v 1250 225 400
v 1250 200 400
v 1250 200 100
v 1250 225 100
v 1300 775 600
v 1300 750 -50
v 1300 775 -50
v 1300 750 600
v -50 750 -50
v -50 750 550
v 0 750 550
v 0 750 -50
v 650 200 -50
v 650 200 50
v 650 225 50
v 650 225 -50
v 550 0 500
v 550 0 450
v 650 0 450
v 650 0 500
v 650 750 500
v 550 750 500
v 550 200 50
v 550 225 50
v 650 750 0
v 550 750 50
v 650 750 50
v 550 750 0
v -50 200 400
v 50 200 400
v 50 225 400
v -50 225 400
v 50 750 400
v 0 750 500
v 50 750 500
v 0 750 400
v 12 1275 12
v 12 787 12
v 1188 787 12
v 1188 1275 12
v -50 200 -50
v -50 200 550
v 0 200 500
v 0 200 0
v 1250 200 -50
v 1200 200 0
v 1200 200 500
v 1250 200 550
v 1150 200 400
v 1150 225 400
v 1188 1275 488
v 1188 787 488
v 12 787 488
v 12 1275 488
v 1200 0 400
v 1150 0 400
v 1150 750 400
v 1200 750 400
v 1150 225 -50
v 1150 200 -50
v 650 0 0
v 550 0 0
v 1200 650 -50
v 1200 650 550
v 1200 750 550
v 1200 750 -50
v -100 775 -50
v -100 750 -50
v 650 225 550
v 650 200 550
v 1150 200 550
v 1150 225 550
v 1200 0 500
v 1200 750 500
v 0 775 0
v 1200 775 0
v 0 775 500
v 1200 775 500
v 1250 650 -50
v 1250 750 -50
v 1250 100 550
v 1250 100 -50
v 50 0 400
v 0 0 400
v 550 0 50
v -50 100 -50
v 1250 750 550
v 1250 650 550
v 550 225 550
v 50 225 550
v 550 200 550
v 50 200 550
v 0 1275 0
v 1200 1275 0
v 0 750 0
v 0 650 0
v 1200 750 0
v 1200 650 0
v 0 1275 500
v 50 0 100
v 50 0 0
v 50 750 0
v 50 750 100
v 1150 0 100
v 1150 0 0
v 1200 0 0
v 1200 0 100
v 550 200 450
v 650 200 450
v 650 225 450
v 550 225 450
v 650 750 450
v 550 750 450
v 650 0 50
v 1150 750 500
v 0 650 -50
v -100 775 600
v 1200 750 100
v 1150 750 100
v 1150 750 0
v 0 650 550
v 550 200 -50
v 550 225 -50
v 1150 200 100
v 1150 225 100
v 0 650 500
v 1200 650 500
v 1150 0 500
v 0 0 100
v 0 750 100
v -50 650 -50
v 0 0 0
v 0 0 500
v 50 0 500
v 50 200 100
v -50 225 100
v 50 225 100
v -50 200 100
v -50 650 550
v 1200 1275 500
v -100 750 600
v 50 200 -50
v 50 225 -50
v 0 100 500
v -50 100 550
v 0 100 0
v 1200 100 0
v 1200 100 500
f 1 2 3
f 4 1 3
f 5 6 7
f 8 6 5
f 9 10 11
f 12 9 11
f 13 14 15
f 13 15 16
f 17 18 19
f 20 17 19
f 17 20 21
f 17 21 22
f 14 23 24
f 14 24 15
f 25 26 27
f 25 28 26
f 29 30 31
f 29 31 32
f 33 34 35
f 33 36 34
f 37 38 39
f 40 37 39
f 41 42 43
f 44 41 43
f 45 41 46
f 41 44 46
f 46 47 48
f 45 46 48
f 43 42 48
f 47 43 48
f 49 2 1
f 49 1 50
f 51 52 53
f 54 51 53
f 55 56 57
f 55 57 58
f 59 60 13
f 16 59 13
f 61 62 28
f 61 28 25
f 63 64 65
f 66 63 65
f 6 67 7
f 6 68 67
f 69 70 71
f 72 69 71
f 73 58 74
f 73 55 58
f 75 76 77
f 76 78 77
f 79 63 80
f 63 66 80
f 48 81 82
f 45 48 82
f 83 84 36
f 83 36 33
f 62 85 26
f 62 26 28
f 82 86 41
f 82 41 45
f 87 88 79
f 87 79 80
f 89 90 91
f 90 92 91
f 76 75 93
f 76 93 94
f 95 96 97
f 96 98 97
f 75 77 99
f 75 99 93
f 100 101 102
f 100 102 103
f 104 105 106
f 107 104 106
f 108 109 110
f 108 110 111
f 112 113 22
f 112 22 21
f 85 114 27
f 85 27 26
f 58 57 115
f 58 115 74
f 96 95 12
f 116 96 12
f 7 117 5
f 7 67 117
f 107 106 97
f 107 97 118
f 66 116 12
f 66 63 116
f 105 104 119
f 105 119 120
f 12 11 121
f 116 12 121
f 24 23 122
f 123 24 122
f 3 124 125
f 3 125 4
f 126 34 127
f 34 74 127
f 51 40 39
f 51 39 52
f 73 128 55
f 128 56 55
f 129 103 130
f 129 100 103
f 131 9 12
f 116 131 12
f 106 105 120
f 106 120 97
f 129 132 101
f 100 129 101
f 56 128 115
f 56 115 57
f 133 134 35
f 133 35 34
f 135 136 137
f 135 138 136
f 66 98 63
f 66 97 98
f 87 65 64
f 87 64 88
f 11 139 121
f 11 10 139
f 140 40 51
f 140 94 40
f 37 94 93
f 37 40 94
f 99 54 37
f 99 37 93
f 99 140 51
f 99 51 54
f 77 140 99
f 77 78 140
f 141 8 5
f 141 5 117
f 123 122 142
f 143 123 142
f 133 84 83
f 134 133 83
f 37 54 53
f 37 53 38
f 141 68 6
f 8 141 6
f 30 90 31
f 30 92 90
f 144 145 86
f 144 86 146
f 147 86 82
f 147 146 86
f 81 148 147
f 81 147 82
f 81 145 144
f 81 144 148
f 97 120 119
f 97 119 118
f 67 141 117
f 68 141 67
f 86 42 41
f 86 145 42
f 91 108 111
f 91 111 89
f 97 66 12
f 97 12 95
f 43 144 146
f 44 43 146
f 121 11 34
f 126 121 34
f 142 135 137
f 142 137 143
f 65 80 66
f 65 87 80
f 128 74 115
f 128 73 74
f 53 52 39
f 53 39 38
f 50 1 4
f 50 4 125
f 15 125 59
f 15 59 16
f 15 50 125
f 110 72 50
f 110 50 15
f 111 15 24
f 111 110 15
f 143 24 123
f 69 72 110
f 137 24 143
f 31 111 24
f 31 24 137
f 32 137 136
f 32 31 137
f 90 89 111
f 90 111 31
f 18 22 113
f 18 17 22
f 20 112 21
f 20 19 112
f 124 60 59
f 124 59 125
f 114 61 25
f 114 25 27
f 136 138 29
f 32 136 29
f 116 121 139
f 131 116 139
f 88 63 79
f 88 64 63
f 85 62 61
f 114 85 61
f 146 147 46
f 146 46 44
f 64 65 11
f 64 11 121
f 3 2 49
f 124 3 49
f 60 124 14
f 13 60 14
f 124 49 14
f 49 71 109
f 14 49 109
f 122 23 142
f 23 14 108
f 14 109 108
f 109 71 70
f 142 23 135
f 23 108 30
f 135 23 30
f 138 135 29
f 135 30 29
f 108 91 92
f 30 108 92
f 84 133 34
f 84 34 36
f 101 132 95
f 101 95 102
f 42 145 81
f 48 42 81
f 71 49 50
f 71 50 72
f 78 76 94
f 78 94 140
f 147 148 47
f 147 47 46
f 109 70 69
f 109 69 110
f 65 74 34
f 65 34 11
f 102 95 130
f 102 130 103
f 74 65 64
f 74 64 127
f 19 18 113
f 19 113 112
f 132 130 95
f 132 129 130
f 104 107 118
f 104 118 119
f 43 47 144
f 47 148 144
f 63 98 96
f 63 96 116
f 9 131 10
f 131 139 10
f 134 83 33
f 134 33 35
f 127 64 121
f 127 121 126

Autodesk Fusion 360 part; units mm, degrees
sketch "Sketch1" plane through (0, 0, 0) normal (0, 1, 0) x (1, 0, 0)
  line L0 (0, 0) -> (50, 0)
  line L1 (50, 0) -> (50, -100)
  line L2 (50, -100) -> (0, -100)
  line L3 (0, -100) -> (0, 0)
  line L4 (1150, -100) -> (1150, 0)
  line L5 (1150, 0) -> (1200, 0)
  line L6 (1200, 0) -> (1200, -100)
  line L7 (1200, -100) -> (1150, -100)
  line L8 (0, -500) -> (0, -400)
  line L9 (0, -400) -> (50, -400)
  line L10 (50, -400) -> (50, -500)
  line L11 (50, -500) -> (0, -500)
  line L12 (1150, -500) -> (1150, -400)
  line L13 (1150, -400) -> (1200, -400)
  line L14 (1200, -400) -> (1200, -500)
  line L15 (1200, -500) -> (1150, -500)
  line L16 (550, 0) -> (650, 0)
  line L17 (650, 0) -> (650, -50)
  line L18 (650, -50) -> (550, -50)
  line L19 (550, -50) -> (550, 0)
  line L20 (550, -450) -> (650, -450)
  line L21 (650, -450) -> (650, -500)
  line L22 (650, -500) -> (550, -500)
  line L23 (550, -500) -> (550, -450)
  line L24 (600, 92.4103) -> (600, -713.1129) construction
  dimension "d1" = 100
  dimension "d2" = 50
  dimension "d5" = 1150
  dimension "d6" = -400
  dimension "d7" = 1200
  dimension "d8" = 500
extrude "Extrude1" add sketch "Sketch1" along normal blind 750 makes body 1 at (50, 250, 33.3333) makes body 2 at (0, 250, 466.6667) makes body 3 at (1150, 250, 66.6667) makes body 4 at (1150, 250, 466.6667) makes body 5 at (583.3333, 250, 0) makes body 6 at (616.6667, 250, 500)
ref_plane "WorkPlane1" through (25, 750, 450) normal (0, 1, 0) x (0, 0, 1)
sketch "Tampo" plane through (25, 750, 450) normal (0, 1, 0) x (1, 0, 0)
  line L0 (-125, 500) -> (1275, 500)
  line L1 (1275, 500) -> (1275, -150)
  line L2 (1275, -150) -> (-125, -150)
  line L3 (-125, -150) -> (-125, 500)
  point P0 (-25, -50)
  point P1 (-25, 450)
  point P2 (1175, 450)
  point P3 (1175, -50)
  dimension "d12" = 100
  dimension "d13" = 50
  dimension "d14" = 100
  dimension "d15" = 100
extrude "Extrude2" add sketch "Tampo" along normal blind 25 separate body makes body 7
sketch "Sketch7" plane through (1200, 0, 0) normal (1, 0, 0) x (0, 0, -1)
  line L0 (-500, 0) -> (-400, 0)
  line L1 (-400, 0) -> (-400, 750)
  line L2 (-400, 750) -> (-500, 750)
  line L3 (-500, 750) -> (-500, 0)
  line L4 (-500, 750) -> (-550, 750)
  line L5 (-550, 750) -> (-550, 650)
  line L6 (-550, 650) -> (-500, 650)
  line L7 (-500, 650) -> (-500, 750)
  line L8 (-600, 775) -> (50, 775)
  line L9 (-100, 0) -> (0, 0)
  line L10 (0, 0) -> (0, 750)
  line L11 (0, 750) -> (-100, 750)
  line L12 (-100, 750) -> (-100, 0)
  line L13 (0, 650) -> (50, 650)
  line L14 (50, 750) -> (-600, 750)
  line L15 (50, 650) -> (50, 750)
  dimension "d18" = 50
  dimension "d19" = 100
  dimension "d22" = 50
  dimension "d23" = 100
extrude "Extrude3" add sketch "Sketch7" against normal up to surface (1200 mm away) separate body contours L3 L4 L5 L6 L7 L14 | L10 L13 L14 L15 makes body 8 at (800, 716.6667, 550) makes body 9 at (800, 683.3333, -50)
sketch "Sketch8" plane through (0, 0, 550) normal (0, 0, 1) x (1, 0, 0)
  line L0 (0, 750) -> (0, 650)
  line L1 (0, 650) -> (1200, 650)
  line L2 (1200, 650) -> (1200, 750)
  line L3 (1200, 750) -> (0, 750)
  line L4 (1200, 650) -> (1250, 650)
  line L5 (1250, 650) -> (1250, 750)
  line L6 (1250, 750) -> (1200, 750)
  line L7 (1200, 750) -> (1200, 650)
  line L8 (0, 650) -> (-50, 650)
  line L9 (-50, 650) -> (-50, 750)
  line L10 (-50, 750) -> (0, 750)
  line L11 (0, 750) -> (0, 650)
  line L12 (1300, 750) -> (-100, 750)
  dimension "d24" = 50
  dimension "d25" = 50
extrude "Extrude4" add sketch "Sketch8" against normal up to surface (600 mm away) separate body contours L0 L8 L9 L10 L11 L12 | L2 L4 L5 L6 L7 L12 makes body 10 at (0, 716.6667, 350) makes body 11 at (1250, 683.3333, 350)
extrude "Extrude5" add 4 faces at (1216.6667, 650, 350) (800, 650, 533.3333) (800, 650, -16.6667) (-16.6667, 650, 350) along direction (0, 1, 0) blind 100 from surface at 100 separate body start surface through (0, 0, 0) normal (0, -1, 0) on bodies 8 9 10 11 makes body 12
sketch "Vidro" plane through (0, 775, 0) normal (0, 1, 0) x (-1, 0, 0)
  line L0 (100, 600) -> (-1300, 600)
  line L1 (-1300, 600) -> (-1300, -50)
  line L2 (-1300, -50) -> (100, -50)
  line L3 (100, -50) -> (100, 600)
  line L4 (0, 0) -> (-1200, 0)
  line L5 (-1200, 0) -> (-1200, 500)
  line L6 (-1200, 500) -> (0, 500)
  line L7 (0, 500) -> (0, 0)
  line L8 (-1188, 488) -> (-12, 488)
  line L9 (-12, 488) -> (-12, 12)
  line L10 (-12, 12) -> (-1188, 12)
  line L11 (-1188, 12) -> (-1188, 488)
  dimension "d31" = 50
  dimension "d32" = 100
  dimension "d33" = 100
  dimension "d34" = 100
  dimension "d35" = 12
extrude "Extrude6" add sketch "Vidro" along normal blind 12 separate body contours L8 L9 L10 L11 makes body 13
extrude "Extrude7" add sketch "Vidro" along normal blind 500 contours L4 L5 L6 L7 bodies 13
sketch "Sketch10" plane through (0, 200, 0) normal (0, 1, 0) x (-1, 0, 0)
  line L0 (0, 0) -> (-1200, 0)
  line L1 (-1200, 0) -> (-1200, 500)
  line L2 (-1200, 500) -> (0, 500)
  line L3 (0, 500) -> (0, 0)
  line L4 (-1250, -50) -> (50, -50)
  line L5 (50, -50) -> (50, 550)
  line L6 (50, 550) -> (-1250, 550)
  line L7 (-1250, 550) -> (-1250, -50)
  line L8 (0, 100) -> (-50, 100)
  line L9 (-50, 100) -> (-50, 0)
  line L10 (-50, 0) -> (0, 0)
  line L11 (0, 0) -> (0, 100)
  line L12 (-50, 500) -> (-50, 400)
  line L13 (-50, 400) -> (0, 400)
  line L14 (0, 400) -> (0, 500)
  line L15 (0, 500) -> (-50, 500)
  line L16 (-550, 50) -> (-650, 50)
  line L17 (-650, 50) -> (-650, 0)
  line L18 (-650, 0) -> (-550, 0)
  line L19 (-550, 0) -> (-550, 50)
  line L20 (-550, 500) -> (-650, 500)
  line L21 (-650, 500) -> (-650, 450)
  line L22 (-650, 450) -> (-550, 450)
  line L23 (-550, 450) -> (-550, 500)
  line L24 (-1200, 100) -> (-1200, 0)
  line L25 (-1200, 0) -> (-1150, 0)
  line L26 (-1150, 0) -> (-1150, 100)
  line L27 (-1150, 100) -> (-1200, 100)
  line L28 (-1200, 500) -> (-1200, 400)
  line L29 (-1200, 400) -> (-1150, 400)
  line L30 (-1150, 400) -> (-1150, 500)
  line L31 (-1150, 500) -> (-1200, 500)
  line L32 (0, 100) -> (50, 100)
  line L33 (-50, 0) -> (-50, -50)
  line L34 (0, 400) -> (50, 400)
  line L35 (-50, 500) -> (-50, 550)
  line L36 (-1150, 0) -> (-1150, -50)
  line L37 (-1200, 100) -> (-1250, 100)
  line L38 (-1200, 400) -> (-1250, 400)
  line L39 (-1150, 500) -> (-1150, 550)
  line L40 (-550, 0) -> (-550, -50)
  line L41 (-650, 0) -> (-650, -50)
  line L42 (-550, 500) -> (-550, 550)
  line L43 (-650, 500) -> (-650, 550)
extrude "Extrude8" add sketch "Sketch10" along normal blind 25 separate body contours L0 L4 L33 L40 | L0 L1 L2 L3 L8 L9 L12 L13 L16 L17 L19 L21 L22 L23 L26 L27 L29 L30 | L3 L5 L32 L34 | L0 L4 L36 L41 | L2 L6 L35 L42 | L1 L7 L37 L38 | L2 L6 L39 L43 makes body 14
